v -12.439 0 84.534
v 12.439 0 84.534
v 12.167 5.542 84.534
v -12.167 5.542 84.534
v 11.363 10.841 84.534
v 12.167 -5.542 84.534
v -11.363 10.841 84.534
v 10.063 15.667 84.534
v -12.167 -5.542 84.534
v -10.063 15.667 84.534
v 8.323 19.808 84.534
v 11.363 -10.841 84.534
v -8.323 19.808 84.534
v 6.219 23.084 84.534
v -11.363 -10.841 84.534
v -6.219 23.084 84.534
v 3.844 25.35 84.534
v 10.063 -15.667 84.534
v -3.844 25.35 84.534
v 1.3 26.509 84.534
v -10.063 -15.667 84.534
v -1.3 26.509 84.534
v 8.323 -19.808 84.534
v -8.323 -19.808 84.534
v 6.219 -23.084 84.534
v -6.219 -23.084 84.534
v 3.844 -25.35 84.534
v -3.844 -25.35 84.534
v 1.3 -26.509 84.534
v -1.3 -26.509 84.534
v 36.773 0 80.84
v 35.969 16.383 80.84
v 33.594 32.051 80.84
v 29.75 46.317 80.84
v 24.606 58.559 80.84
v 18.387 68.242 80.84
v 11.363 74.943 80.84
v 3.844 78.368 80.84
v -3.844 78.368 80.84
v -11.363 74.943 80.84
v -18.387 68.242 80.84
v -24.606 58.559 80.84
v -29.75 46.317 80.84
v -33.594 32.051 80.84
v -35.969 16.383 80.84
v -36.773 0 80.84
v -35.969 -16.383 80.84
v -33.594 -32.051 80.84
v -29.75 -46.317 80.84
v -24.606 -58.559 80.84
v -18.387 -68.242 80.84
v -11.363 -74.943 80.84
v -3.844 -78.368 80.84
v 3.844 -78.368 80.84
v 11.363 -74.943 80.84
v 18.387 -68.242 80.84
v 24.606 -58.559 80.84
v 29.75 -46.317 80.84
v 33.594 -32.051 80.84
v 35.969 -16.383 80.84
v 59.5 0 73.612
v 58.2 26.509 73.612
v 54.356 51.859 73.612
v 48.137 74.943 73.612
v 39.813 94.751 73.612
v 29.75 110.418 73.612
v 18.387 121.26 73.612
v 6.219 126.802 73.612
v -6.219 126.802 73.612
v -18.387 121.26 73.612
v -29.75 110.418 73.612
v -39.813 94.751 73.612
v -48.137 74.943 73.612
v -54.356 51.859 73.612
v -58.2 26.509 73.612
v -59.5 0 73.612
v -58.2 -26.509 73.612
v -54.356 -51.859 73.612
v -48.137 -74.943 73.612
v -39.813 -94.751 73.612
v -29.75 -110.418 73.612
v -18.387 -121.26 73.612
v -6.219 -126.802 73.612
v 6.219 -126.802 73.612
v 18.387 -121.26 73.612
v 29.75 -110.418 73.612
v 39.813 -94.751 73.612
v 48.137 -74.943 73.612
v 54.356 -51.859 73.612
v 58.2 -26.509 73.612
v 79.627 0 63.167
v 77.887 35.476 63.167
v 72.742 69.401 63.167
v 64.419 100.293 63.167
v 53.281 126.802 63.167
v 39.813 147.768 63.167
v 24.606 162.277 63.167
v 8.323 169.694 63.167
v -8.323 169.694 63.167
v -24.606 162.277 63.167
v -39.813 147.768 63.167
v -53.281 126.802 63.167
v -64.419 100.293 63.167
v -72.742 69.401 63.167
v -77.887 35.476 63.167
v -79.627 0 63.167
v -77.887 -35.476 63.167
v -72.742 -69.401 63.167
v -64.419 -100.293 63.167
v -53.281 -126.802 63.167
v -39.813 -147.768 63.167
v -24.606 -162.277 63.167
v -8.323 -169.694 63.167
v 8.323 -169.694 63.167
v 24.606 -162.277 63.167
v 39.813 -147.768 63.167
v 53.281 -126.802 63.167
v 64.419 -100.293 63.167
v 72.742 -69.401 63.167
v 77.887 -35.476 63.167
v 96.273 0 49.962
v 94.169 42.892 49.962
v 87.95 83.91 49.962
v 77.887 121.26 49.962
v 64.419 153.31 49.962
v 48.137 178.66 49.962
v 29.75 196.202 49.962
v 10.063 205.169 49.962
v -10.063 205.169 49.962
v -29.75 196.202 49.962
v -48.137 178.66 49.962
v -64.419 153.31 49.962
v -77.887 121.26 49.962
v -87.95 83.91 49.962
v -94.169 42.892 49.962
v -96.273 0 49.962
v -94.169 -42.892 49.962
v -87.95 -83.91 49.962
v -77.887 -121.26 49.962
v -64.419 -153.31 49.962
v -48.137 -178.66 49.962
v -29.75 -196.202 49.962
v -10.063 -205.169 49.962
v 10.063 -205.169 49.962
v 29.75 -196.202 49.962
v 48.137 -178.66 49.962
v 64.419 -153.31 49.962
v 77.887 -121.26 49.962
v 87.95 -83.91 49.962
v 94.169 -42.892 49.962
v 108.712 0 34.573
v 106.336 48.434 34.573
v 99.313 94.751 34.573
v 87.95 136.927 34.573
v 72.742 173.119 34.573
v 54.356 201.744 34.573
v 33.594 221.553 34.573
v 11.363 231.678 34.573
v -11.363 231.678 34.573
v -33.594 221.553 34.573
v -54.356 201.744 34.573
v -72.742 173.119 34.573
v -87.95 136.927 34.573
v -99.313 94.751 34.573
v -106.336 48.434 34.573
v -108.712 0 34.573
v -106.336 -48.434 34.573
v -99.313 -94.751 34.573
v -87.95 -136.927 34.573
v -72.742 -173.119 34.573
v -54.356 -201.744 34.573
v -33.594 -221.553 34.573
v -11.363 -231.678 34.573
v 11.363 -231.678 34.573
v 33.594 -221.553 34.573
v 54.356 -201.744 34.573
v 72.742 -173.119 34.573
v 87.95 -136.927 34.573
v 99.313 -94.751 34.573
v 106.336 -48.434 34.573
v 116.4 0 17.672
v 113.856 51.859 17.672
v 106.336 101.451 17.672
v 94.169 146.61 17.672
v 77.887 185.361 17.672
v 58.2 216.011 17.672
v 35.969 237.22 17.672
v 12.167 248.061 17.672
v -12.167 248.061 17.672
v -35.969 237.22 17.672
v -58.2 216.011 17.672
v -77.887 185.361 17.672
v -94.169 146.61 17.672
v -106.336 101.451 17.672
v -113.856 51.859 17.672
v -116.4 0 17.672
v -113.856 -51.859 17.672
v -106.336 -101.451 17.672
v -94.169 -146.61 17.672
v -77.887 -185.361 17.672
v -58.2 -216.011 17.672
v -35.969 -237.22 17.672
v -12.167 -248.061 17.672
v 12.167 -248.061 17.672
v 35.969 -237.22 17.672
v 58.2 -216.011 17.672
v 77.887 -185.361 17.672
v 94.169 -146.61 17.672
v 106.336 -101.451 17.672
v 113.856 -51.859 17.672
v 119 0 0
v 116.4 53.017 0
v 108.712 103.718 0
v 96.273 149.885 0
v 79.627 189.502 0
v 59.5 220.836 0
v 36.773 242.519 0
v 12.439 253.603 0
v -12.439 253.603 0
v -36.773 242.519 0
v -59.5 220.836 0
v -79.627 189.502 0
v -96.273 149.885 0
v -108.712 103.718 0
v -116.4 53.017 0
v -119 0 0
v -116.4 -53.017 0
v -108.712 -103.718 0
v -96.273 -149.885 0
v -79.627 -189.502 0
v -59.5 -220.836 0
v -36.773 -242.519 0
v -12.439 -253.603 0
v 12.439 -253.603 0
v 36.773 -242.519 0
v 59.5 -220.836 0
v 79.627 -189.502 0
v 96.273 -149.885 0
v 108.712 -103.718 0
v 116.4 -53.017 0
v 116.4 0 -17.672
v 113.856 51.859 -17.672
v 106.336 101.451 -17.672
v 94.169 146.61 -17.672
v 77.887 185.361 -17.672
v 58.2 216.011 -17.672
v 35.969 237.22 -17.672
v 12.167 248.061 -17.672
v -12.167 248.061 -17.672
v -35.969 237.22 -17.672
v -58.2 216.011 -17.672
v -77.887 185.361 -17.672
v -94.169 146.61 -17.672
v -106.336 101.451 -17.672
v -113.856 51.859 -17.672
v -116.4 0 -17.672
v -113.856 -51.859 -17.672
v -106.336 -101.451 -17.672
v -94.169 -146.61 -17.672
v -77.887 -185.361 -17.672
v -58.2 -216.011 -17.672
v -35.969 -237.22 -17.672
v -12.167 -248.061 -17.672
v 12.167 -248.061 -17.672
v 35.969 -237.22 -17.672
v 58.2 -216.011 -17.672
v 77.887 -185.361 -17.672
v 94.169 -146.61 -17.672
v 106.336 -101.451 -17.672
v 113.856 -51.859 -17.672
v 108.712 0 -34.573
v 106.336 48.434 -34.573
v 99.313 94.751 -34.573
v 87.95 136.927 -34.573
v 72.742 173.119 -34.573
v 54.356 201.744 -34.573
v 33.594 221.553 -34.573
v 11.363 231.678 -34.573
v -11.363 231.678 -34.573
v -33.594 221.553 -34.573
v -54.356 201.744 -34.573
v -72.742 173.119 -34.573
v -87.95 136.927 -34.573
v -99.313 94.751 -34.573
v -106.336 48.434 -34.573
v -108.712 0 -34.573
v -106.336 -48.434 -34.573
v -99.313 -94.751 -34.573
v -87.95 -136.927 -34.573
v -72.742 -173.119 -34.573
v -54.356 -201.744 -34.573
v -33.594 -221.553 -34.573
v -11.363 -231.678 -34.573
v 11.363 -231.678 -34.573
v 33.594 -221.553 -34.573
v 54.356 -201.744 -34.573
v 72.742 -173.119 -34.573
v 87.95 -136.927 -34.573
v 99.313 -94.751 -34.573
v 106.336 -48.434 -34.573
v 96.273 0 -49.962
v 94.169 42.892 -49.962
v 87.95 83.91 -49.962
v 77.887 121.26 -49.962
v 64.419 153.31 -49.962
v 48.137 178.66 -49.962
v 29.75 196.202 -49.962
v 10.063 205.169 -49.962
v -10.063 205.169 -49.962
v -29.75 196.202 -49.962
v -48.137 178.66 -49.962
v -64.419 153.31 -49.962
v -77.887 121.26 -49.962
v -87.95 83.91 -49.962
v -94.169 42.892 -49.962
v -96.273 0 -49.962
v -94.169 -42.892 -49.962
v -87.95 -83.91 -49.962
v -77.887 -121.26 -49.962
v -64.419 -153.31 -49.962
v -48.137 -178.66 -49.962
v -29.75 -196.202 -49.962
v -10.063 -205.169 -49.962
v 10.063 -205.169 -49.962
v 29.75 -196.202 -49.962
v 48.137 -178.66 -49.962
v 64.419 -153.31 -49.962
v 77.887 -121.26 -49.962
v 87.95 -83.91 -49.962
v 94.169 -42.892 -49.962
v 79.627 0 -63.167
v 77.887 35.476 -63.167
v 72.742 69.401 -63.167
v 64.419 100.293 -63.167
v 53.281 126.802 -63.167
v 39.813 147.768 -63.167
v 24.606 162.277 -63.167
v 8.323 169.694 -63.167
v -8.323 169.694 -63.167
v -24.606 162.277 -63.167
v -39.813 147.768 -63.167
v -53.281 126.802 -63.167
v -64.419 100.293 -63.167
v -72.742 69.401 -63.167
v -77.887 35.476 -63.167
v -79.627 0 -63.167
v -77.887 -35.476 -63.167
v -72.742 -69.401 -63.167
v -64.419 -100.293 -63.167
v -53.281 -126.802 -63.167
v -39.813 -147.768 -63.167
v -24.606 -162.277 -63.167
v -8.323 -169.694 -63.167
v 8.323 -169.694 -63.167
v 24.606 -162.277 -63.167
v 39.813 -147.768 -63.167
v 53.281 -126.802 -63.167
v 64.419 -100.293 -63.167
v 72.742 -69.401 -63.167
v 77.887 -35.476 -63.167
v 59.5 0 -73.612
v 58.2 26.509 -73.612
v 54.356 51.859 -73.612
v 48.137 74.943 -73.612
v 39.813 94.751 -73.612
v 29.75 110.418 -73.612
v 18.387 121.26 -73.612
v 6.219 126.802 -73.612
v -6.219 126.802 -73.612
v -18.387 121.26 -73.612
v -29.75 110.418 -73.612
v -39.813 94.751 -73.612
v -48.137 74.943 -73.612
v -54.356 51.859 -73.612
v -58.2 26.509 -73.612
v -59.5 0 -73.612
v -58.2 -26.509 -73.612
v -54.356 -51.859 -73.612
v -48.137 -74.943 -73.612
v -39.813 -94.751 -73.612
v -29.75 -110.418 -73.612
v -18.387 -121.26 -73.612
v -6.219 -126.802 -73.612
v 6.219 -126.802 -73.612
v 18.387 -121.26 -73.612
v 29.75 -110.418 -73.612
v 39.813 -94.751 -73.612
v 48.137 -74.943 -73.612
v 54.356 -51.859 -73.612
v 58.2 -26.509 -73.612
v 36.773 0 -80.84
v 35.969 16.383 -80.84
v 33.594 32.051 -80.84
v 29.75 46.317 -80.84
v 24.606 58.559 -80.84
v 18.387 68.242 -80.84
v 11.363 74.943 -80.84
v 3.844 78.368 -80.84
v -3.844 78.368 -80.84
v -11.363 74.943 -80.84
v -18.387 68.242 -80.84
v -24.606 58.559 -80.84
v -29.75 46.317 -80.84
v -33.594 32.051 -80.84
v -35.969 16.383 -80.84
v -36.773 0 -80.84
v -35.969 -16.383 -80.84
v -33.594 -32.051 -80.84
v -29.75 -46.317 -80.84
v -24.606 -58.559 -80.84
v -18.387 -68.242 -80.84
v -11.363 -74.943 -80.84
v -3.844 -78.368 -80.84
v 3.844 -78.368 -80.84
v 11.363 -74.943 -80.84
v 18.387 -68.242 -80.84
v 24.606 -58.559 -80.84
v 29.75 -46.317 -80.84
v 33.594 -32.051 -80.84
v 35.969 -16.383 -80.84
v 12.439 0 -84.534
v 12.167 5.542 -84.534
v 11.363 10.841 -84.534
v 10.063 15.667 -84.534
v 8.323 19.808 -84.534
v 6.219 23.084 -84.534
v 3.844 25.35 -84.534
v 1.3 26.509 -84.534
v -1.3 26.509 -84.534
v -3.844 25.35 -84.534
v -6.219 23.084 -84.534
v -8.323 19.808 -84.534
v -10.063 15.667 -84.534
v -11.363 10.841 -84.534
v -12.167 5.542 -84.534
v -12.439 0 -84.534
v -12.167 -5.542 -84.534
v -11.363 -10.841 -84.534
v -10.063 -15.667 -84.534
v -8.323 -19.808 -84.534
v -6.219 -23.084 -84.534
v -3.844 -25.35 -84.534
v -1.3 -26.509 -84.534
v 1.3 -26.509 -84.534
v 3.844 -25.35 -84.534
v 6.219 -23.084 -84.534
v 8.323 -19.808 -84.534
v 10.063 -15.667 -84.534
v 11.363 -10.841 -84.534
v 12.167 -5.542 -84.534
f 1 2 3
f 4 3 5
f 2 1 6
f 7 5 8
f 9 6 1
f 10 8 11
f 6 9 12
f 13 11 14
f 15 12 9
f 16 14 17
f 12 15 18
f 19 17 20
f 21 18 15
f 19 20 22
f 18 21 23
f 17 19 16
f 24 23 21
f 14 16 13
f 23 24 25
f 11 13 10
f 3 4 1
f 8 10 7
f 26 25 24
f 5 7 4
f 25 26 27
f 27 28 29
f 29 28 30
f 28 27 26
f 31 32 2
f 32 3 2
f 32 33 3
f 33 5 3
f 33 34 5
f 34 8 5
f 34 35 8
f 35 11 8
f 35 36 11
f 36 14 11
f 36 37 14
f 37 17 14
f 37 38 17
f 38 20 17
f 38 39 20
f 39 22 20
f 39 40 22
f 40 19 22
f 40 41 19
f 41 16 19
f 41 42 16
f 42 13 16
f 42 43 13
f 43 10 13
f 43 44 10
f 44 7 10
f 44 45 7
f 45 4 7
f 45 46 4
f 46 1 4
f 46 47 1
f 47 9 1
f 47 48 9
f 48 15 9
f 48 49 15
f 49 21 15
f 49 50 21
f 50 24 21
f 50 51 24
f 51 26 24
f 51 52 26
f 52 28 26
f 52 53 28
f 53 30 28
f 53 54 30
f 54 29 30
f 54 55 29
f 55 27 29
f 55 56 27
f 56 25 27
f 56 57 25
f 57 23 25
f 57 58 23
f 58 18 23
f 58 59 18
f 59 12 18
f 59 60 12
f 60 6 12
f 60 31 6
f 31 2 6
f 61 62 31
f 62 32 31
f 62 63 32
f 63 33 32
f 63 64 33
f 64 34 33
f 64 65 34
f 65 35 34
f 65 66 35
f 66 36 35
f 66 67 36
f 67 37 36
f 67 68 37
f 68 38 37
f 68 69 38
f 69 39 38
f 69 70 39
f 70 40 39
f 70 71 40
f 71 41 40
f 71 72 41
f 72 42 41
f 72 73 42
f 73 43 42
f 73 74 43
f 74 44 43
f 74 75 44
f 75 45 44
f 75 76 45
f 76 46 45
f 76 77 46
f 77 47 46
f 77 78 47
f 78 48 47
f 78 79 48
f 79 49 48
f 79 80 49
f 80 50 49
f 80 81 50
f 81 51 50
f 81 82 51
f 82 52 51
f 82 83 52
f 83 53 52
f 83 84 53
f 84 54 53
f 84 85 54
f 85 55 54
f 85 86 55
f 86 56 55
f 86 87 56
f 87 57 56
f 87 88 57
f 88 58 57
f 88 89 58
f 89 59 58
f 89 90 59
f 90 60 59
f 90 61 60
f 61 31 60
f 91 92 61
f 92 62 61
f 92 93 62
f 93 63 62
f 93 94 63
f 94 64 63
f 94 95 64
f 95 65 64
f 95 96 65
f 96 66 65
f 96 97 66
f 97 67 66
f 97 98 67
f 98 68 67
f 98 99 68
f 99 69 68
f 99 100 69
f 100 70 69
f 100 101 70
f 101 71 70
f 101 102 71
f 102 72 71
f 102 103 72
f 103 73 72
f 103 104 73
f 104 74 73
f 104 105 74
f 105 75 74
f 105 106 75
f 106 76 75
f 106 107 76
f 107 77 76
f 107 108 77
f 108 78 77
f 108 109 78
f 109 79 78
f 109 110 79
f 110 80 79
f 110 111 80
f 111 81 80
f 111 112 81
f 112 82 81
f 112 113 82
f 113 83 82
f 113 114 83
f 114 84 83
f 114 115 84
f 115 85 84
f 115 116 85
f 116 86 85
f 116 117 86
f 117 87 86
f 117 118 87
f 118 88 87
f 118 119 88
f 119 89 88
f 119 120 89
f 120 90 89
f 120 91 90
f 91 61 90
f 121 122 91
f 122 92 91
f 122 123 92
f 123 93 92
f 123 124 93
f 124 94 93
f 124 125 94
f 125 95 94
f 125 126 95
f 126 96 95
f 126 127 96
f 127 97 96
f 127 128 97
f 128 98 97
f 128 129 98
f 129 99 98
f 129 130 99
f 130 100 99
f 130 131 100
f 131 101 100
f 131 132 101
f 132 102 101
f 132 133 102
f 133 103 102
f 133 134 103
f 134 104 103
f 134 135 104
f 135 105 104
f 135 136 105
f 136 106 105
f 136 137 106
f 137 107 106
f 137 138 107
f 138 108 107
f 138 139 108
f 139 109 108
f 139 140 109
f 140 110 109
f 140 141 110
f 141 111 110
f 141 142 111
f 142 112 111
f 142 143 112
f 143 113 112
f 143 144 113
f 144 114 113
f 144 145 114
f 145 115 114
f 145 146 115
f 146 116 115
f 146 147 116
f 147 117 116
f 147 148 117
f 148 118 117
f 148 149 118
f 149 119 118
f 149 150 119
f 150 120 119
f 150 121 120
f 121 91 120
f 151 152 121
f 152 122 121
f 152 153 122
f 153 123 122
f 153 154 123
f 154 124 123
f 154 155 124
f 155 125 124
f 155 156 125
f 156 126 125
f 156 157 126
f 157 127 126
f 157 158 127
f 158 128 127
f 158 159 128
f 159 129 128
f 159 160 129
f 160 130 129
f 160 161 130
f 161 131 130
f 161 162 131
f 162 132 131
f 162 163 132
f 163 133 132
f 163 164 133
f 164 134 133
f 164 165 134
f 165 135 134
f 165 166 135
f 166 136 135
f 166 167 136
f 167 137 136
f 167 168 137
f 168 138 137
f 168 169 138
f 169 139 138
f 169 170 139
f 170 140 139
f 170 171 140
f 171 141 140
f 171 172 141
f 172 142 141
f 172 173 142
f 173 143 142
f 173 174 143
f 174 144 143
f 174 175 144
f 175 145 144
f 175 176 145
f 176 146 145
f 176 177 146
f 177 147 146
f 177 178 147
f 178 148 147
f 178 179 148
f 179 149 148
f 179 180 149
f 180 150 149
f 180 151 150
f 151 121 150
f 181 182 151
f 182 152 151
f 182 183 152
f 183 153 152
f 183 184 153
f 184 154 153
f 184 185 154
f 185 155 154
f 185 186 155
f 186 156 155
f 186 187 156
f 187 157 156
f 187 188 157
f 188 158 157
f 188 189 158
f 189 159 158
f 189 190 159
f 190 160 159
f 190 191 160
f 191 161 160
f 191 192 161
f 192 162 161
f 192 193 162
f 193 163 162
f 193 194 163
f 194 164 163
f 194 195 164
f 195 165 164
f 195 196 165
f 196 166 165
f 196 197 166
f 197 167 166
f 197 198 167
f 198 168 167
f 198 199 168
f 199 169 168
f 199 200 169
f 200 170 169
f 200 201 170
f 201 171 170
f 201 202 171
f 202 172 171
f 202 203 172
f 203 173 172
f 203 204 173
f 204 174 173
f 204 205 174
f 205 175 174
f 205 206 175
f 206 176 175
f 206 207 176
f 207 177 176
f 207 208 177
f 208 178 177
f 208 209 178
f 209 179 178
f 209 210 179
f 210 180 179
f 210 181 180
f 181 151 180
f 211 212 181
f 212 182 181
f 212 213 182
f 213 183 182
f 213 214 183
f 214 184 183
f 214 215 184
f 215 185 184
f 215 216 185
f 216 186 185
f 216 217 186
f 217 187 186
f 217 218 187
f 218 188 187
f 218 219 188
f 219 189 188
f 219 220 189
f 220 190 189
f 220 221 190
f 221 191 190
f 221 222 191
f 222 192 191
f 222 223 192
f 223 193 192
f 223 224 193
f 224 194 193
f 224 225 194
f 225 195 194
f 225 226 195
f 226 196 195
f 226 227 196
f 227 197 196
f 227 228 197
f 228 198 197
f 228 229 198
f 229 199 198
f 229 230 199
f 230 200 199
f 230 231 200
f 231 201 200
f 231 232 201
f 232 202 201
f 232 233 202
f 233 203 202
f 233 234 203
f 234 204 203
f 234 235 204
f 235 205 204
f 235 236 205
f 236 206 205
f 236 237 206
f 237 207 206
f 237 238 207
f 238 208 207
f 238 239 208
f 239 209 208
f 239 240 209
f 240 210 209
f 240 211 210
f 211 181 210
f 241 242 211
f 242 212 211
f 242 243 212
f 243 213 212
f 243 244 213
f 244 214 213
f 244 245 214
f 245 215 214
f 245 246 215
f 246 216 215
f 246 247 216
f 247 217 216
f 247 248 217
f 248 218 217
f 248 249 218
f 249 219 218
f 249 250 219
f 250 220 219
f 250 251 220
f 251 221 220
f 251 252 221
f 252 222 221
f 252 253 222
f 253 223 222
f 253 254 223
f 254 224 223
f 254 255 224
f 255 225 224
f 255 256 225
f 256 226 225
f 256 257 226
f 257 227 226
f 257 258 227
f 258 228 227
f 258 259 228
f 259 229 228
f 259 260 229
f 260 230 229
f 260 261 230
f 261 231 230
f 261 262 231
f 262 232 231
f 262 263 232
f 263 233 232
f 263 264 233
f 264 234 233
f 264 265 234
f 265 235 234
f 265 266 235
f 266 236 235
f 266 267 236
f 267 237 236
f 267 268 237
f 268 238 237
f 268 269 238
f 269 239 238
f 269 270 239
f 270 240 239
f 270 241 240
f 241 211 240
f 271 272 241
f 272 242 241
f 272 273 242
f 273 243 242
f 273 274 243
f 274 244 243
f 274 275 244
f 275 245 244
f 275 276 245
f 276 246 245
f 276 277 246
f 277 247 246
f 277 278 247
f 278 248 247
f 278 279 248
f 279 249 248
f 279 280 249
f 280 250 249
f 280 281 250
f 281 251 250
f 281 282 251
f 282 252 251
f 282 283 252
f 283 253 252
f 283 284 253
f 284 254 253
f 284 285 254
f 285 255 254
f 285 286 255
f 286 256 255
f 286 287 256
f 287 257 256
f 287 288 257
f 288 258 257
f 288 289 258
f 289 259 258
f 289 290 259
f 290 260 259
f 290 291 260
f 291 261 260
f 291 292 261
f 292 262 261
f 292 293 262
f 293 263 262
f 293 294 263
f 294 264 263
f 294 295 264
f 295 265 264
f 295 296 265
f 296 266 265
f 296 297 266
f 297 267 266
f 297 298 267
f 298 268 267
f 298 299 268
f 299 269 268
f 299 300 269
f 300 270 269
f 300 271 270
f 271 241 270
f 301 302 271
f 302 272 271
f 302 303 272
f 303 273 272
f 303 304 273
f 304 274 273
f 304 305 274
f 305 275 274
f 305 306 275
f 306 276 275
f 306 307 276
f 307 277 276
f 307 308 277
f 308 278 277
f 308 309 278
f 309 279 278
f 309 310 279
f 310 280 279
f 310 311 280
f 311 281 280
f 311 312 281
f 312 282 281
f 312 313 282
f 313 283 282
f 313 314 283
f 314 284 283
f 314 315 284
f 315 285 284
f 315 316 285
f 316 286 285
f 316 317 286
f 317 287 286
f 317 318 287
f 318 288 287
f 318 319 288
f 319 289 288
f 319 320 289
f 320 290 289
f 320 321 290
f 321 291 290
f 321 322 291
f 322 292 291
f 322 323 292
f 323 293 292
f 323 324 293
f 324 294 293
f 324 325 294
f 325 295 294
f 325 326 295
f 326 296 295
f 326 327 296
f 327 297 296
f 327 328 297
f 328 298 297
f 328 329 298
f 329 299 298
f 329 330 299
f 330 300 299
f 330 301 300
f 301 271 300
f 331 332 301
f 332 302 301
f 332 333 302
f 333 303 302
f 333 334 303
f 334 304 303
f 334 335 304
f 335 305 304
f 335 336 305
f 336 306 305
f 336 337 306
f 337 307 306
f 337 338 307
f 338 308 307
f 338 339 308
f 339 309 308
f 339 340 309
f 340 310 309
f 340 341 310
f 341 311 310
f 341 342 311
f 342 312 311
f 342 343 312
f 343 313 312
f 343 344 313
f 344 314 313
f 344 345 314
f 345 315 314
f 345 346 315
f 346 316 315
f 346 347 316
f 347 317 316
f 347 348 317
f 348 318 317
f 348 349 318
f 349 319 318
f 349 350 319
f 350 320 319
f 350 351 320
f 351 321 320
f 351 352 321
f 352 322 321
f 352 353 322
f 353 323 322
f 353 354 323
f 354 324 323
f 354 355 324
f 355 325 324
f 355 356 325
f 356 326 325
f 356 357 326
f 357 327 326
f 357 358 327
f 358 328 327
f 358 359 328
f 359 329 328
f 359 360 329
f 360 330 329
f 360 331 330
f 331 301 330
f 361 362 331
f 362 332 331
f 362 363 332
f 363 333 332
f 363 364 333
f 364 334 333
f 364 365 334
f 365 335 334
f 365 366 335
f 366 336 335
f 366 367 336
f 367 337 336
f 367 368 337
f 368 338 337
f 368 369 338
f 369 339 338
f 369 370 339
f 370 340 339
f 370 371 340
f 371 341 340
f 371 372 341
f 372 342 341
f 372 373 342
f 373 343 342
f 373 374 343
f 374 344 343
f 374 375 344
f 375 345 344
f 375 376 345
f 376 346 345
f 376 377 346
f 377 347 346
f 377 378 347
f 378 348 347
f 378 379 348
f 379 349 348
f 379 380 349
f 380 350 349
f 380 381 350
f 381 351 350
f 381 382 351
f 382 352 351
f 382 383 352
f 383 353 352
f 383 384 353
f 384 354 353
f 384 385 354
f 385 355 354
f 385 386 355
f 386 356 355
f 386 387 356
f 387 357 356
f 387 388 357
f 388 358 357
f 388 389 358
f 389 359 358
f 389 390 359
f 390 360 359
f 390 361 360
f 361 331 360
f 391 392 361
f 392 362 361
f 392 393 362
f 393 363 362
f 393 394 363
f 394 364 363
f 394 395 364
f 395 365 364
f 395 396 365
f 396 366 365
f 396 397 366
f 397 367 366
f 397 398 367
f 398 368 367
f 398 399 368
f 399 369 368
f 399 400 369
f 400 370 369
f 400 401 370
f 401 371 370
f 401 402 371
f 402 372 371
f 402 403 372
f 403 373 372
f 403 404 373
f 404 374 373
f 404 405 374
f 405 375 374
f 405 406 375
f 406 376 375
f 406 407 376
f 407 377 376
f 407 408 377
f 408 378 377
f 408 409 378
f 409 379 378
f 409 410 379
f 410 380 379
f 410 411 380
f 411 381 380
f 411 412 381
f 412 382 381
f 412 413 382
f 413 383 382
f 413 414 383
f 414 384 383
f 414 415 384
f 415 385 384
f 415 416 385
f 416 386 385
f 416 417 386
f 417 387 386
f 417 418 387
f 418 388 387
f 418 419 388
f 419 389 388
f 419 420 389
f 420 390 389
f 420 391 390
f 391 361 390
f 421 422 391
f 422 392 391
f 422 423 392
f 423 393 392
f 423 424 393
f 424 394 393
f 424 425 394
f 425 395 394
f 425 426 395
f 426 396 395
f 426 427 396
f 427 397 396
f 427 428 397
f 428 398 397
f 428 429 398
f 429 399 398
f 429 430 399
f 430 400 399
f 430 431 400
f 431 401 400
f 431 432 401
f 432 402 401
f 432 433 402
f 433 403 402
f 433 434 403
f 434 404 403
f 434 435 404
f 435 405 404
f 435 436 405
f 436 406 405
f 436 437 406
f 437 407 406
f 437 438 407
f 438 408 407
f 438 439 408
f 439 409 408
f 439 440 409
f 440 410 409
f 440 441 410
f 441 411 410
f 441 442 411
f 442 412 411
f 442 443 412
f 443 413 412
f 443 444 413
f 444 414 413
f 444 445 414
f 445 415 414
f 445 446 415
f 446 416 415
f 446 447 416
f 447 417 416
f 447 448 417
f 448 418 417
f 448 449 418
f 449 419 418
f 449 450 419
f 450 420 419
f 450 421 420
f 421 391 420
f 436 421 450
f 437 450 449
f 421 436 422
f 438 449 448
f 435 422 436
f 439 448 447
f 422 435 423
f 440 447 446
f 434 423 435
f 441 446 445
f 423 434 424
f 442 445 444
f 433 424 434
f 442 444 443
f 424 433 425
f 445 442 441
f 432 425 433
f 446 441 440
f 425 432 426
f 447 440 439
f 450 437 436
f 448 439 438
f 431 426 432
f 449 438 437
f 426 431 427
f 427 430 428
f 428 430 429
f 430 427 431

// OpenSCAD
// Generated by SolidPython 1.0.1 on 2020-07-29 00:46:48


scale(v = [7, 15, 5]) {
	sphere(r = 17);
}
/***********************************************
*********      SolidPython code:      **********
************************************************
 
# import packages: SolidPython
from solid import *
from solid.utils import *
from itertools import chain, combinations, permutations


class Resize:

    def __init__(self, scad_file):
        self.scad_file = scad_file
        #self.scad_file = import_scad(scad_file)
        # cone/cylinder param:
        self.r1 = 0
        self.r2 = 0
        self.h = 0
        # rectangular prism param:
        self.w = 0
        self.l = 0
        # ellipse param:
        self.r = 0

    # import OpenScad code (file name corresponds to shape)


    # classify shape + parameters
    def assign(self, param1, param2, param3):
        if self.scad_file == 'cone.scad':
            self.r1 = param1
            self.r2 = param2
            self.h = param3
        elif self.scad_file == 'cylinder.scad':
            self.r1 = param1
            self.r2 = param2
            self.h = param3
        elif self.scad_file == 'rectangularPrism.scad':
            self.h = param1
            self.l = param2
            self.w = param3
        else:
            self.r = param1
            self.h = param2

    # resize parameters
    def iterate(self):
        x = range(3, 20, 2)
        i = 1
        if self.scad_file == 'cone.scad':
            tempList = list(permutations(x, 2))
            for temp in tempList:
                param1 = temp[0]
                param2 = temp[1]
                filepath = 'produced_scad_files/' + 'cone' + str(param1) + '_' + str(param2) + '_' + '.scad'
                scad_render_to_file(cylinder(h=param1, r1=param2, r2=0), filepath)

        elif self.scad_file == 'cylinder.scad':
            tempList = list(permutations(x, 3))
            for temp in tempList:
                param1 = temp[0]
                param2 = temp[1]
                filepath = 'produced_scad_files/' + 'cylinder' + str(param1) + '_' + str(param2) + '_' + '.scad'
                scad_render_to_file(cylinder(h=param1, r1=param2, r2=param2), filepath)

        elif self.scad_file == 'rectangularPrism.scad':
            tempList = list(permutations(x, 3))
            for temp in tempList:
                param1 = temp[0]
                param2 = temp[1]
                param3 = temp[2]
                filepath = 'produced_scad_files/' + 'rectangularPrism' + str(param1) + '_' + str(param2) + '_' + str(
                    param3) + '.scad'
                scad_render_to_file(cube(size=(param1, param2, param3)), filepath)

        elif self.scad_file == 'ellipse.scad':
            tempList = list(permutations(x, 4))
            for temp in tempList:
                param1 = temp[0]
                param2 = temp[1]
                param3 = temp[2]
                param4 = temp[3]
                filepath = 'produced_scad_files/' + 'ellipse' + str(param1) + '_' + str(param2) + '_' + str(param3) + '_' + str(param4) + '.scad'
                scad_render_to_file(scale([param1, param2, param3])(sphere(r=param4)), filepath)

    def render_to_scadfile(self):
        scad_render_to_file(scad, 'example.scad') 
 
************************************************/
